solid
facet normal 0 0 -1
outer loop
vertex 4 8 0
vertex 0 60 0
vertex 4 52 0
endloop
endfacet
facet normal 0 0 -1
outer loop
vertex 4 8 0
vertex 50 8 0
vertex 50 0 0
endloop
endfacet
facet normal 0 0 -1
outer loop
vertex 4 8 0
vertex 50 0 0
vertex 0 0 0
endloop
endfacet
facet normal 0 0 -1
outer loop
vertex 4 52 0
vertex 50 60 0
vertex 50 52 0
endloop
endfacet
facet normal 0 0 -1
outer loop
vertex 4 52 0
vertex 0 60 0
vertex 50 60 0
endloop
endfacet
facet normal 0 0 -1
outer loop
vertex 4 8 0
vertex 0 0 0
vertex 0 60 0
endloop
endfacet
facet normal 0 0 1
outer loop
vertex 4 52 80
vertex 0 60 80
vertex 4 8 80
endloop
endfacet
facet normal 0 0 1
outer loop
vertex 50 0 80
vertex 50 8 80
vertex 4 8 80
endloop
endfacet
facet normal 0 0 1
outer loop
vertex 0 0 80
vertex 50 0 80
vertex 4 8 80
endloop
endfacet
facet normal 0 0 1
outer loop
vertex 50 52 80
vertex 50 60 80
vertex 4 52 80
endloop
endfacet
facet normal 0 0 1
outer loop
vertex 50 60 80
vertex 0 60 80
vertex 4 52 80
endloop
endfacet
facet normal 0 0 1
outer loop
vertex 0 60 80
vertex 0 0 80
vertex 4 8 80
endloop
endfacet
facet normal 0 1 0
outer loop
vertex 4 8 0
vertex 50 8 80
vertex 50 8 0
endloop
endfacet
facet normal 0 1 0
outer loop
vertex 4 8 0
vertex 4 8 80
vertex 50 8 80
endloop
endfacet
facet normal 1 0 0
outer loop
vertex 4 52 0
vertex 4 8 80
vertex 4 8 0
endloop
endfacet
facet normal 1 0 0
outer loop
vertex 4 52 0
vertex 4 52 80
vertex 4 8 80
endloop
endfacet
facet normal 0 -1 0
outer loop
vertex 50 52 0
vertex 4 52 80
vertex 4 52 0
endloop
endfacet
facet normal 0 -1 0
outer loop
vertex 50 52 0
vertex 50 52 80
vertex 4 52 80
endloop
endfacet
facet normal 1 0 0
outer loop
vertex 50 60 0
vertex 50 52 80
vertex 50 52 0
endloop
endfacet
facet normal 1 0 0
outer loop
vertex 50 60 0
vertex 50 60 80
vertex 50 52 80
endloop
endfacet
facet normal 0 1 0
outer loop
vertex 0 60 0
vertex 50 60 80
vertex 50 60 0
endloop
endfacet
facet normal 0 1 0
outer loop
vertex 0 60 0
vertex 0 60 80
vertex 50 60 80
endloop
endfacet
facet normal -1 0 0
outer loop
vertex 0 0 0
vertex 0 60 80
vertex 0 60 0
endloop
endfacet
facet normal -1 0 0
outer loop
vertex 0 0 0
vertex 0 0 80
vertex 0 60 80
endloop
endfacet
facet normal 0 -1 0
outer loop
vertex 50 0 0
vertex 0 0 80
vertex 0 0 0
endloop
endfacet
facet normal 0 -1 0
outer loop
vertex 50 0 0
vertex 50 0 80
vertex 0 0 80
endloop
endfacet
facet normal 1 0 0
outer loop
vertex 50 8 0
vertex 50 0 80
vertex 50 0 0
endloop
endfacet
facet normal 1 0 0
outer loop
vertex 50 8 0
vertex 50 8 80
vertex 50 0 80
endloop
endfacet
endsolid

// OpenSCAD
$fn = 32;

// ----------------------------------------------------------------------
// Structural section: channel 50 x 60 mm
// ----------------------------------------------------------------------

// --- parameters (mm) ---
sec_w = 50;               // channel width, X
sec_h = 60;               // channel height, Y
flange_t = 8;             // flange thickness
web_t = 4;                // web thickness
plate_t = 80;             // cut length, Z (extrusion height)

profile = [[0, 0], [50, 0], [50, 8], [4, 8], [4, 52], [50, 52], [50, 60], [0, 60]];  // primary outline, 8 points, counter clockwise

// --- the one profile operation ---
linear_extrude(height = plate_t) polygon(points = profile);
